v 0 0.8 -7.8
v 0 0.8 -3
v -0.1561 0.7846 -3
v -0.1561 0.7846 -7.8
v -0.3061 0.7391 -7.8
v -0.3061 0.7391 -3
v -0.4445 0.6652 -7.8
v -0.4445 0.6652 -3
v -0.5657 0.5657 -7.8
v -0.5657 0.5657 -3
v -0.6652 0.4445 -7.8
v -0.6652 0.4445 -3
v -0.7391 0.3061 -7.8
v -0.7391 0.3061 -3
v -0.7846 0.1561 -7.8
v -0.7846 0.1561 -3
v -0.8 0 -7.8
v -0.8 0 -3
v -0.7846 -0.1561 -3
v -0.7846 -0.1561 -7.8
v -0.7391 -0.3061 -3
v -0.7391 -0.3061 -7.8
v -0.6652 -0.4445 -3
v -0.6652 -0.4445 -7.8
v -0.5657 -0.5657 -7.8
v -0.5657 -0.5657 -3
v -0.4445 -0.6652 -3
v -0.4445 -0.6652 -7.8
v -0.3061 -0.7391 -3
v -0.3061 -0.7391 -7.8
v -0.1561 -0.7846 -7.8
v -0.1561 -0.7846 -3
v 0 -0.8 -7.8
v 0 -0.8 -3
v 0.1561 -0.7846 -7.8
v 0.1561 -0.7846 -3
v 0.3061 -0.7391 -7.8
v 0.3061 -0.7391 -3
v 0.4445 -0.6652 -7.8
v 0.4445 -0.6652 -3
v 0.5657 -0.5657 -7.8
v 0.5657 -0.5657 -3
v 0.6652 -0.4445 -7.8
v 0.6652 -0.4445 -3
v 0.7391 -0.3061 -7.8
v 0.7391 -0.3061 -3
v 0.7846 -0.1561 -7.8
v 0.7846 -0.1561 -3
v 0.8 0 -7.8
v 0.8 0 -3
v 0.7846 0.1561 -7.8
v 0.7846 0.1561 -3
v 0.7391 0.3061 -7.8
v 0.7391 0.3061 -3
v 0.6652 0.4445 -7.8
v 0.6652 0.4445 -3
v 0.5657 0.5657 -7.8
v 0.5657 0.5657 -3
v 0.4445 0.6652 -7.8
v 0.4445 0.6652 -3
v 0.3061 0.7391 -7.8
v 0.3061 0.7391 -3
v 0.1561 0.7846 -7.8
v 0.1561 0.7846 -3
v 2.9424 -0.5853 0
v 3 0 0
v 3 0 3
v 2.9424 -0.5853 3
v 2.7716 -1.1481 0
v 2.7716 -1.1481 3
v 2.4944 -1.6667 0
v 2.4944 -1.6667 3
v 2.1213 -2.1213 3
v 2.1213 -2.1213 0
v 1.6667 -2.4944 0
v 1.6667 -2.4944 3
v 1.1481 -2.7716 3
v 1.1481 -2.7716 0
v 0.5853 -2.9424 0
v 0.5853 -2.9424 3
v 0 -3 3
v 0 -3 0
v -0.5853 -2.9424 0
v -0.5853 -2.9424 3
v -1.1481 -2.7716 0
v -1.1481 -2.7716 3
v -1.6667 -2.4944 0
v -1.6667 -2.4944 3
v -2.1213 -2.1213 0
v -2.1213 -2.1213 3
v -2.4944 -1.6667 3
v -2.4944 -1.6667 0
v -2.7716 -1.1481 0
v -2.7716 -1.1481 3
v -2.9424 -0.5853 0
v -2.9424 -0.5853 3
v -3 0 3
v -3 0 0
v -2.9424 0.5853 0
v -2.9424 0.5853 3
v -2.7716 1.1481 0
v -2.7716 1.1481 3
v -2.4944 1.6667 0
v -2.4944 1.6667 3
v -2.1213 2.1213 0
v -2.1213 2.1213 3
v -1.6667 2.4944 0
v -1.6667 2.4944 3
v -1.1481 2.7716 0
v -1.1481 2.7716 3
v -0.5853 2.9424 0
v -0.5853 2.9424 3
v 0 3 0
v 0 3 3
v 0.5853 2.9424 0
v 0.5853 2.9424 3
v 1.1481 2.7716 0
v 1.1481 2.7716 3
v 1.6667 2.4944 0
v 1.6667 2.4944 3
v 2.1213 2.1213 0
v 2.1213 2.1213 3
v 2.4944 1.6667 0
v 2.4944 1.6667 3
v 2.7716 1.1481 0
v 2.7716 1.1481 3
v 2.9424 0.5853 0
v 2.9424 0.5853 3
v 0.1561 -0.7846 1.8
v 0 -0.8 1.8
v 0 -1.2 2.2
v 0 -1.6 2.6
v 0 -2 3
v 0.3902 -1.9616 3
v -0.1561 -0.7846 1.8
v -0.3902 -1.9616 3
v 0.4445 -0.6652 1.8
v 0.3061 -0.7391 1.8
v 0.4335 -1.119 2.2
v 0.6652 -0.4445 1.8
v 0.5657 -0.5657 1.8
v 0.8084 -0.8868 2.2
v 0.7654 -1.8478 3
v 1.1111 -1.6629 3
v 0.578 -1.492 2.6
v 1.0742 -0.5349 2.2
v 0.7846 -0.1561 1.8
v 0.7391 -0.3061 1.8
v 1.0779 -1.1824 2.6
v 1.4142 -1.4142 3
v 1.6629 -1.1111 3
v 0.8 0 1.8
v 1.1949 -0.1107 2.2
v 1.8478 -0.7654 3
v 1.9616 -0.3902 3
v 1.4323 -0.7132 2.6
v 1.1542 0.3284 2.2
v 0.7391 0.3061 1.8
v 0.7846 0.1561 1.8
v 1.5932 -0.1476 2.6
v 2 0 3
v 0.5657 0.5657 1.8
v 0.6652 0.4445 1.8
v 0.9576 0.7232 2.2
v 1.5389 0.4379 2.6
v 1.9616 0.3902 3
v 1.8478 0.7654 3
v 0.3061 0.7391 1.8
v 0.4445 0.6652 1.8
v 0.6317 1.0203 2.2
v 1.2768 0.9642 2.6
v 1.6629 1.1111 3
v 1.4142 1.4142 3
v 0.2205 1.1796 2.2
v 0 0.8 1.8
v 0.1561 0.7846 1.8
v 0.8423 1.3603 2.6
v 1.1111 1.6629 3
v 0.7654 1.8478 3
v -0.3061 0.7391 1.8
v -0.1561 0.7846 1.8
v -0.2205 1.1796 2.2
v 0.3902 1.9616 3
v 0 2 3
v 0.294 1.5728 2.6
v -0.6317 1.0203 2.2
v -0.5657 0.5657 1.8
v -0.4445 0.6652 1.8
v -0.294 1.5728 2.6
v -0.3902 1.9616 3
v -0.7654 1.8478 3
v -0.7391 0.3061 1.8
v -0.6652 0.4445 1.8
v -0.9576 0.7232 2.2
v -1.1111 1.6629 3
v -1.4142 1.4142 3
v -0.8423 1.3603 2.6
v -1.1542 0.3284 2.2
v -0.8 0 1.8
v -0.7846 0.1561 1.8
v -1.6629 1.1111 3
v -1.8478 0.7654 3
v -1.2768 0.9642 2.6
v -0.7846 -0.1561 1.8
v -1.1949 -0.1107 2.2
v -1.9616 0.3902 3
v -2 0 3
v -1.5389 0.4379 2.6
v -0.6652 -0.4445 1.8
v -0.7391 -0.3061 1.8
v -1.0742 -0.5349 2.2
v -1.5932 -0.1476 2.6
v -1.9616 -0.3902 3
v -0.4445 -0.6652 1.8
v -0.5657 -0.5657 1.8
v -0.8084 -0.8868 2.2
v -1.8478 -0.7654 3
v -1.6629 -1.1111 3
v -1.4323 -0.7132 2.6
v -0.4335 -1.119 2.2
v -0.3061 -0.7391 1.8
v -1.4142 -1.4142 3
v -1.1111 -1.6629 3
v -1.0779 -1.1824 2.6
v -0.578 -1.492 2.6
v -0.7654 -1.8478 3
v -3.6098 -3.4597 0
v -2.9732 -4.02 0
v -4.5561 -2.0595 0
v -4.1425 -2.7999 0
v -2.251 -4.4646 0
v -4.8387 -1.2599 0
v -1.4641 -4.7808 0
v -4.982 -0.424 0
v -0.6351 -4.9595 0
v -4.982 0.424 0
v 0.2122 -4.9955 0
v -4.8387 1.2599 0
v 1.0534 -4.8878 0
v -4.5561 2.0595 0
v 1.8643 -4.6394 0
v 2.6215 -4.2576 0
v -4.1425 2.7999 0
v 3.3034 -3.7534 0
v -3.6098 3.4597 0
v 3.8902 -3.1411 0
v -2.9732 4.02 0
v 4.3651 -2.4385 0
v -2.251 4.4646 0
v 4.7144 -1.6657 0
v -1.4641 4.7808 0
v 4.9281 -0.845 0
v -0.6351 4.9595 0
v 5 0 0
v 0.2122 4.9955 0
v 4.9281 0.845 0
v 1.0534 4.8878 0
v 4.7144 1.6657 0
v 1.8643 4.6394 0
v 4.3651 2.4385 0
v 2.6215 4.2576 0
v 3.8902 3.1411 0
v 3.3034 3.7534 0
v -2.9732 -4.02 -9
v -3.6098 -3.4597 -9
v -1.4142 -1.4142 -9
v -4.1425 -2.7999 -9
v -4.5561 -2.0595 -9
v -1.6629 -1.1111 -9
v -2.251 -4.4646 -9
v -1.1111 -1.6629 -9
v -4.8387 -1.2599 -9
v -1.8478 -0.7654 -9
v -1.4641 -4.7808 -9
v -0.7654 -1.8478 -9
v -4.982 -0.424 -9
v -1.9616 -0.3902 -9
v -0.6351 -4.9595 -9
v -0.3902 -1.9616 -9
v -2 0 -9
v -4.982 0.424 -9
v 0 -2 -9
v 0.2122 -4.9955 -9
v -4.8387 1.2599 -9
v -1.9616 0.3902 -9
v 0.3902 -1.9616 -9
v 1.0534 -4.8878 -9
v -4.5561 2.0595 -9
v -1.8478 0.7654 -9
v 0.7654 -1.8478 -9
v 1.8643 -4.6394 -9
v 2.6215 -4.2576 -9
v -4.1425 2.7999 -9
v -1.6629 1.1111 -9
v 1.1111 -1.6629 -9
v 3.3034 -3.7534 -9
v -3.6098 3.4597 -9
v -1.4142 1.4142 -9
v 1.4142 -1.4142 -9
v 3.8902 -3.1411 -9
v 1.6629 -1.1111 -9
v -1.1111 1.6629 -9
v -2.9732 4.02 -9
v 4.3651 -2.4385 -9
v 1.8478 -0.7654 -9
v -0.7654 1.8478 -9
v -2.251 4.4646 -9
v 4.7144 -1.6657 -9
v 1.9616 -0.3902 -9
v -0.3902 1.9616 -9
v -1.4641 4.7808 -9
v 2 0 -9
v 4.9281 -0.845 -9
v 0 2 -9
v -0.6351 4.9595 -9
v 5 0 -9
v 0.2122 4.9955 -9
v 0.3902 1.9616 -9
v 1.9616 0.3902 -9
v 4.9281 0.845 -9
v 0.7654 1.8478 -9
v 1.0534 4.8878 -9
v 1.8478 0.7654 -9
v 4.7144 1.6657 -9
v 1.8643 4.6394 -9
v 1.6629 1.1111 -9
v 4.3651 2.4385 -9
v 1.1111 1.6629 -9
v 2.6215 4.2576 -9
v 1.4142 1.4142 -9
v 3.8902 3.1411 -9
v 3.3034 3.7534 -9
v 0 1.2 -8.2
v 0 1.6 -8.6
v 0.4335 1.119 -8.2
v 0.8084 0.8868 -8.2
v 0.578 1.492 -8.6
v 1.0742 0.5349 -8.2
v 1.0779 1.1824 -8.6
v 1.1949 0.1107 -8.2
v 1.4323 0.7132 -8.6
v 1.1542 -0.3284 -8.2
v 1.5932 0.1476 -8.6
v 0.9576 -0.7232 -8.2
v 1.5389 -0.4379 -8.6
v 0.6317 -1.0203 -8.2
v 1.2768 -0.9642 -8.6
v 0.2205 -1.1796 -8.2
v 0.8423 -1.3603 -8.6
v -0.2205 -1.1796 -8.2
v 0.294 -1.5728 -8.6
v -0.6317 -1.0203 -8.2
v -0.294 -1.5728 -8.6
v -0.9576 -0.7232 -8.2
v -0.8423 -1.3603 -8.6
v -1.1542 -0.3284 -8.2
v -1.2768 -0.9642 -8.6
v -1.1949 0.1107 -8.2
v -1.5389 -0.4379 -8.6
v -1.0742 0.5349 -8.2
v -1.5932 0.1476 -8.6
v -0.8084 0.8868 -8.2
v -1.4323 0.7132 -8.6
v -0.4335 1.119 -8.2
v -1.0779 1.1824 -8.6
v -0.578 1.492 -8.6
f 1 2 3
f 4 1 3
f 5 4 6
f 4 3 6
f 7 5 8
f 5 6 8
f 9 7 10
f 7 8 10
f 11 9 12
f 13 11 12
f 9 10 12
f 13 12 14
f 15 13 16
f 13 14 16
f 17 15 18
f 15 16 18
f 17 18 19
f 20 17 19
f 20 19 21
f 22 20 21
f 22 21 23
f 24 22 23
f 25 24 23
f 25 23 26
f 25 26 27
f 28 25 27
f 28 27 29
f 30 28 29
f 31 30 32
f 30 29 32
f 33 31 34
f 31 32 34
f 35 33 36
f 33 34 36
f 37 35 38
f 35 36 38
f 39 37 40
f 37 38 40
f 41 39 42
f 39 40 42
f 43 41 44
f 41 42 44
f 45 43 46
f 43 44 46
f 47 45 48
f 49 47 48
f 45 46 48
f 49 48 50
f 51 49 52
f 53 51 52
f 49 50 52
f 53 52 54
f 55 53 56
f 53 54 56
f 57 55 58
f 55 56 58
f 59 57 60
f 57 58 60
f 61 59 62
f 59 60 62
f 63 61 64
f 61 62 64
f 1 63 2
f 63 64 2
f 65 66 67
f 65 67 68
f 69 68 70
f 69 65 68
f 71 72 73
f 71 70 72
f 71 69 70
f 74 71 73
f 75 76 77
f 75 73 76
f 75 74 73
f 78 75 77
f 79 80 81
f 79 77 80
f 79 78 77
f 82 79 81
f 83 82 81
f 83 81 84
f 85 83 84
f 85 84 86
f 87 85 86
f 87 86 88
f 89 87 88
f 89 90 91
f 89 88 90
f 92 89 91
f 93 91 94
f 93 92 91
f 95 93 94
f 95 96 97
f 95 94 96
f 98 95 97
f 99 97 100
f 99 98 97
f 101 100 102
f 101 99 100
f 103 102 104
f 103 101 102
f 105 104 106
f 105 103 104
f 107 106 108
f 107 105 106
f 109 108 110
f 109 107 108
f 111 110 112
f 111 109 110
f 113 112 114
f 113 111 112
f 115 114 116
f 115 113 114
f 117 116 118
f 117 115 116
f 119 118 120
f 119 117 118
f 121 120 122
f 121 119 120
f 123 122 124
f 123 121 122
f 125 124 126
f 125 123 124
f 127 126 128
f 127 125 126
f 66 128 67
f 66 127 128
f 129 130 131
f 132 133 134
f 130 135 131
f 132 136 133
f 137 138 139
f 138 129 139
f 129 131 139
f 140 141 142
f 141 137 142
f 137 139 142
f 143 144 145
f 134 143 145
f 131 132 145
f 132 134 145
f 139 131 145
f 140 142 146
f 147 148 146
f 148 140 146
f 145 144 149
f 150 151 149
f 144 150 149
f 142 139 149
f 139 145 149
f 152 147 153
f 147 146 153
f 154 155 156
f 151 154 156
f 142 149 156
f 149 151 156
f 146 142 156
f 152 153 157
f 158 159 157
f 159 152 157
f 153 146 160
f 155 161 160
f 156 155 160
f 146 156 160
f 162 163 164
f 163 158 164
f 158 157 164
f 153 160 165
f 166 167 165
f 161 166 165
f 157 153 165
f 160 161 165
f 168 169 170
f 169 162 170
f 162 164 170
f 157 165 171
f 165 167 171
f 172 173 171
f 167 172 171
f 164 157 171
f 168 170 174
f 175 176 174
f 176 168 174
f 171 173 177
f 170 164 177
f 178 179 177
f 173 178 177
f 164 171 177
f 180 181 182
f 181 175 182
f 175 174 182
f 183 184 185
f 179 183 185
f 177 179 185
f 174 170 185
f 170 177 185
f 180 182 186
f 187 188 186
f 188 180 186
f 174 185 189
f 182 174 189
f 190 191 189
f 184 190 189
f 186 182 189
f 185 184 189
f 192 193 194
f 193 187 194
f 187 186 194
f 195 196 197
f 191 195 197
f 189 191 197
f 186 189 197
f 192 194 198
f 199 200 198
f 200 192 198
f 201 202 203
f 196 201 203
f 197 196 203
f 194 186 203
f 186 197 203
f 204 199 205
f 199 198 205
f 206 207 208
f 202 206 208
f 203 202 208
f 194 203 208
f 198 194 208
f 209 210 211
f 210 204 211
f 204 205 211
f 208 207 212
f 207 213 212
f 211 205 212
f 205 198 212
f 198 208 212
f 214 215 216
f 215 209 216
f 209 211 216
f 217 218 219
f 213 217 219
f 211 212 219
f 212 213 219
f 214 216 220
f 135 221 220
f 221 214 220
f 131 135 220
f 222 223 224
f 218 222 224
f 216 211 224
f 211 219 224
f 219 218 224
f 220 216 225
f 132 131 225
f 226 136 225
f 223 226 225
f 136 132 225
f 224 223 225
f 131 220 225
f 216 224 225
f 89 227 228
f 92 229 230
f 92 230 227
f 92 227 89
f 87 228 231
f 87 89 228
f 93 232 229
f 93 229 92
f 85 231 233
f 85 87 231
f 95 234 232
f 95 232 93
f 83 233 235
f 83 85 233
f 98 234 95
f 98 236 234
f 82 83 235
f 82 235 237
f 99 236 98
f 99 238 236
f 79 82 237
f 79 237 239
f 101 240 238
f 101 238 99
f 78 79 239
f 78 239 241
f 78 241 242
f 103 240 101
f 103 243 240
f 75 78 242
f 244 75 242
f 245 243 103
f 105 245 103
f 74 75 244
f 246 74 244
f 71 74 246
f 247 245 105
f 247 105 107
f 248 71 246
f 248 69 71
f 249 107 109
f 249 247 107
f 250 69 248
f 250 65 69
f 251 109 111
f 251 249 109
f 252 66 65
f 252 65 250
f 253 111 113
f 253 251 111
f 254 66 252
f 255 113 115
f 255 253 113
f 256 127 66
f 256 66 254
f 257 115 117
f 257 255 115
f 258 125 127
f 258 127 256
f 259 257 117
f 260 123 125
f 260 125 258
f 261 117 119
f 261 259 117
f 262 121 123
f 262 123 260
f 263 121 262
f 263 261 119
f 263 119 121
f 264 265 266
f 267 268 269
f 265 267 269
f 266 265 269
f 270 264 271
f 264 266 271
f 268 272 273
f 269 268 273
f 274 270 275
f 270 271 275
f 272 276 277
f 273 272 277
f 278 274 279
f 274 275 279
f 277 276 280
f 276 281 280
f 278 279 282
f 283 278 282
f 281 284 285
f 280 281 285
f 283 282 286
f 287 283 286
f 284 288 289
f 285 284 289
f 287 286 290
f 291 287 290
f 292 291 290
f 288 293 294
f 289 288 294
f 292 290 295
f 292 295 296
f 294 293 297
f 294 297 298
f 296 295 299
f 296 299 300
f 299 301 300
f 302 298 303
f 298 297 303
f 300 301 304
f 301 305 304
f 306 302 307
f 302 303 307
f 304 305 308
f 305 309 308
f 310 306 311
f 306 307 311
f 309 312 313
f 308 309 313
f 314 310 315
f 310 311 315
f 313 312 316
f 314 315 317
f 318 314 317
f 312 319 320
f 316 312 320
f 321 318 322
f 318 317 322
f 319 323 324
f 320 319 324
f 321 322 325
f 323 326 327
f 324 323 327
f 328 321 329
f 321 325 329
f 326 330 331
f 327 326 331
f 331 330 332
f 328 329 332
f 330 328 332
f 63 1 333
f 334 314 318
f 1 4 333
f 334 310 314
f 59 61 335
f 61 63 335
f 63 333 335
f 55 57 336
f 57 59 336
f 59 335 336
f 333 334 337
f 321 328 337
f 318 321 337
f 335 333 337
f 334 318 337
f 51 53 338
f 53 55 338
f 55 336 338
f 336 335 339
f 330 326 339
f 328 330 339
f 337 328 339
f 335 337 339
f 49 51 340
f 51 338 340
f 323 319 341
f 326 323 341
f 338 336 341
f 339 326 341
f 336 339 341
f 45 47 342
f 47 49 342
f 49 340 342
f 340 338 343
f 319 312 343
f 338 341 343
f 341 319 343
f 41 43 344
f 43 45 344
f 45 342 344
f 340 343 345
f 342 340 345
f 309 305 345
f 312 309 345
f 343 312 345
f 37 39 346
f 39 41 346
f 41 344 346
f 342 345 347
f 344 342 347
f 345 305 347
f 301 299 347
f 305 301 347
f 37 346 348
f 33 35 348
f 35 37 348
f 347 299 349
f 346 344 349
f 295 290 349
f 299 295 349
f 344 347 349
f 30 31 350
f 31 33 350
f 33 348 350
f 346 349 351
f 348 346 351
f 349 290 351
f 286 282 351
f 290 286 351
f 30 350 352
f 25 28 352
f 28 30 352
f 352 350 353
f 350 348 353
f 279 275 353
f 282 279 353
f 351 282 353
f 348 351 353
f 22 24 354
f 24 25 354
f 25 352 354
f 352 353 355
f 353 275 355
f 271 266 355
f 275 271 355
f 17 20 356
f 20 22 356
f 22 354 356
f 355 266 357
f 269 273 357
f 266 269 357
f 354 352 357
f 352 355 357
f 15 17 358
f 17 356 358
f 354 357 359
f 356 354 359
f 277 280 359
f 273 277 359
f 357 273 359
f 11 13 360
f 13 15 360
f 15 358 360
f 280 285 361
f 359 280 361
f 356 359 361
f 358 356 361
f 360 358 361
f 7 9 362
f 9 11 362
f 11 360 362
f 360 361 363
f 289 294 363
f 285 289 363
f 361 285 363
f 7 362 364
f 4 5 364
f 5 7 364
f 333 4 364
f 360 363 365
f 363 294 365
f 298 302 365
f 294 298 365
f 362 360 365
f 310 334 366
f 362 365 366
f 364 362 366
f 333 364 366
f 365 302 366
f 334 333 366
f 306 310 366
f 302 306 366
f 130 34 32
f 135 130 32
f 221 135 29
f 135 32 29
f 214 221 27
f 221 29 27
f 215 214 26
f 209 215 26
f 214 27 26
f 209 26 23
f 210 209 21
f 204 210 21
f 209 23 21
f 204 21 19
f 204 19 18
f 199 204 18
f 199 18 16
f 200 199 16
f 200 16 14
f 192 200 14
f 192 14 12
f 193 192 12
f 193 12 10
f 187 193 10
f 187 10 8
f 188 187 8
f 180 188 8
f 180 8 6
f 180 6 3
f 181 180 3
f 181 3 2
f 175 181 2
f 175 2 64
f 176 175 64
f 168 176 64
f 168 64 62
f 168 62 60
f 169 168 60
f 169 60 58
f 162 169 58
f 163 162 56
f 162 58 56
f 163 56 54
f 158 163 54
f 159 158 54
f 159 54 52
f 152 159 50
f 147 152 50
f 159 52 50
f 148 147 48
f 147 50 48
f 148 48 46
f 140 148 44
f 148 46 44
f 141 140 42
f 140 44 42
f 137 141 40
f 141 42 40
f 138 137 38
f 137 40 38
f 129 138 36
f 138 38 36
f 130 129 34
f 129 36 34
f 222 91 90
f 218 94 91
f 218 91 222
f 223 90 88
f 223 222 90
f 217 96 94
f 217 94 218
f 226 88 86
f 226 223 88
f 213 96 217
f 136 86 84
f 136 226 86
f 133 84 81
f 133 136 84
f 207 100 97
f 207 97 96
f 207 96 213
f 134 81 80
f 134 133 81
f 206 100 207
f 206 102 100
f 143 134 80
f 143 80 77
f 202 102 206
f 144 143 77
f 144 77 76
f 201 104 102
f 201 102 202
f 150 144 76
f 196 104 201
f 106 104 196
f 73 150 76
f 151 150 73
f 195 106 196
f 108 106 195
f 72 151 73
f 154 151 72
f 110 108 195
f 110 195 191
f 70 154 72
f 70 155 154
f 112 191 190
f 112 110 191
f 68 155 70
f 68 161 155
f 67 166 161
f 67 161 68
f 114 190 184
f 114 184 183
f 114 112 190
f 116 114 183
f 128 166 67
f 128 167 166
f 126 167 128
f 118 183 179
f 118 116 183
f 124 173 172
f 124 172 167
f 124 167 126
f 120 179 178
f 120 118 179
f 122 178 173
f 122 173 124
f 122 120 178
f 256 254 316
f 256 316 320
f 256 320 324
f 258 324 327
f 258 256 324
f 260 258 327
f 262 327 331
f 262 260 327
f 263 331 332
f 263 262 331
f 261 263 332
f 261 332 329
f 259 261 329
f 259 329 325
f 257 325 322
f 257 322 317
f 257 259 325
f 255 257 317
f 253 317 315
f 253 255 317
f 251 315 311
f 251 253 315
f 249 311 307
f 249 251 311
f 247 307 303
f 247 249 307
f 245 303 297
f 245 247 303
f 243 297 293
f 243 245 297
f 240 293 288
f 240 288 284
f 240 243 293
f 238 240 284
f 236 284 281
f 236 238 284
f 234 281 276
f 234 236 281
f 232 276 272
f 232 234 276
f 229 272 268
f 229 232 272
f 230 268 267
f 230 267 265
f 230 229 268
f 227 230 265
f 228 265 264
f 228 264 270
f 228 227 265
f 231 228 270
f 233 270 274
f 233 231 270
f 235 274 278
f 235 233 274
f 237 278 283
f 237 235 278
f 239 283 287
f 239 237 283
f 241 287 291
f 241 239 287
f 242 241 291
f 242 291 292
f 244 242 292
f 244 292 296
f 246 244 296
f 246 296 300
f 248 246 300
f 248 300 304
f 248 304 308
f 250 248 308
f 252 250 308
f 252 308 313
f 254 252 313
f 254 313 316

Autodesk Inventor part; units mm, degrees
ref_plane "YZ Plane" through (0, 0, 0) normal (1, 0, 0) x (0, 1, 0)
ref_plane "XZ Plane" through (0, 0, 0) normal (0, 1, 0) x (-1, 0, 0)
ref_plane "XY Plane" through (0, 0, 0) normal (0, 0, 1) x (1, 0, 0)
sketch "Skizze1" plane through (0, 0, 0) normal (0, 0, 1) x (1, 0, 0)
  circle A0 centre (0, 0) radius 5
  dimension "d0" = 10
extrude "Extrusion1" add sketch "Skizze1" against normal blind 9
sketch "Skizze2" plane through (0, 0, 0) normal (0, 0, 1) x (1, 0, 0)
  circle A0 centre (0, 0) radius 3
  dimension "d3" = 6
extrude "Extrusion2" add sketch "Skizze2" along normal blind 3
sketch "Skizze3" plane through (0, 0, 3) normal (0, 0, 1) x (1, 0, 0)
  circle A0 centre (0, 0) radius 3 projected
hole "Bohrung1" at (0, 0, 3) direction (0, 0, -1) diameter 1.6 depth 6 countersink diameter 4 countersink angle 90
sketch "Skizze4" plane through (0, 0, -9) normal (0, 0, -1) x (-1, 0, 0)
  circle A0 centre (0, 0) radius 5 projected
hole "Bohrung2" at (0, 0, -9) direction (0, 0, 1) diameter 1.6 depth 6 countersink diameter 4 countersink angle 90
properties part number "Führungsbüchse" material "Kupfer"
